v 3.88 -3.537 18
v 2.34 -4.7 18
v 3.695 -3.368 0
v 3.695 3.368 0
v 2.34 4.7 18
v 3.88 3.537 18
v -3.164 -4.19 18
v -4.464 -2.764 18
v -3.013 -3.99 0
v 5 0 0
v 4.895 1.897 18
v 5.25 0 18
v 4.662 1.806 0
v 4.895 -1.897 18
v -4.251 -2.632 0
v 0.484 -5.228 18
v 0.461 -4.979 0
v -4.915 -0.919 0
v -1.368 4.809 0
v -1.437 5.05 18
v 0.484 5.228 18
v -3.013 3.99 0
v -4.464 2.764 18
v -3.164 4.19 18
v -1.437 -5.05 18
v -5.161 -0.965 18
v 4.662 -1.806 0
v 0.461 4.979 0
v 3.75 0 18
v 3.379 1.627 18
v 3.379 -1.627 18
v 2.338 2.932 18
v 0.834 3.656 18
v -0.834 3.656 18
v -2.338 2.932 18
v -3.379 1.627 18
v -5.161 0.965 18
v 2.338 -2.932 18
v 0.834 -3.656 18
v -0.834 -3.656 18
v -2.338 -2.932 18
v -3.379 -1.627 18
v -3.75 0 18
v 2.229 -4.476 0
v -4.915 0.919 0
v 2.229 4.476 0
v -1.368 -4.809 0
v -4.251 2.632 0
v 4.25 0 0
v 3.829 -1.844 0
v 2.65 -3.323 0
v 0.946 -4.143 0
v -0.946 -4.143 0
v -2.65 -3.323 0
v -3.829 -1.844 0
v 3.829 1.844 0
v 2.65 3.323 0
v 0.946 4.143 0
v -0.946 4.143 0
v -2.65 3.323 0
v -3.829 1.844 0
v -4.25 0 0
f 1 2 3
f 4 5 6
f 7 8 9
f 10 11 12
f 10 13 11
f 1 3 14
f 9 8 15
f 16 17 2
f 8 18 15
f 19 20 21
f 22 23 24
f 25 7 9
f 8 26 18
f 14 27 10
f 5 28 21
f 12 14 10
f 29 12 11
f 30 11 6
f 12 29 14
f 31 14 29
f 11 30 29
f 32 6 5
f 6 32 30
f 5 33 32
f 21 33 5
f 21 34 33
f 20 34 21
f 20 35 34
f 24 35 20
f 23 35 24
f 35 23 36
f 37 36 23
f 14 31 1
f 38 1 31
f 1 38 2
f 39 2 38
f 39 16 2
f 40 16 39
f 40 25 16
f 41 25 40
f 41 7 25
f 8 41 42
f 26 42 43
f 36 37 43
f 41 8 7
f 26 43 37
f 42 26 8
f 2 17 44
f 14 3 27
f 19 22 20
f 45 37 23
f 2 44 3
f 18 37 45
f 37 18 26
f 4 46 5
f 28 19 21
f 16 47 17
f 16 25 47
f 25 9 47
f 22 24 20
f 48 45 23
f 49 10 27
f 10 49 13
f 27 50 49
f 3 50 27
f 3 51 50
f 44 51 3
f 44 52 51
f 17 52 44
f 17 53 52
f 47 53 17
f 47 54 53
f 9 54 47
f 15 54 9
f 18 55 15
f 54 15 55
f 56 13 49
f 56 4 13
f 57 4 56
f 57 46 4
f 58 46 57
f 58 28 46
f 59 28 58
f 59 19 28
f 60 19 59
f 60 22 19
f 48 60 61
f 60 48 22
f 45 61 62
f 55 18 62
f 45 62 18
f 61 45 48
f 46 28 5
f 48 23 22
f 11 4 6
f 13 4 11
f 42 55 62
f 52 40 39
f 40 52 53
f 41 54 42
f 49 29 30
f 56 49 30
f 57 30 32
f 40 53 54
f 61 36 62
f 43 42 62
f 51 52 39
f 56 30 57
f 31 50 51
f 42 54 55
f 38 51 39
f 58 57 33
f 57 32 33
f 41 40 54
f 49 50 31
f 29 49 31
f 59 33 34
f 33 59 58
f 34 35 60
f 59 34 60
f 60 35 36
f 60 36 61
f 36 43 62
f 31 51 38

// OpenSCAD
difference() {
    color("red") cylinder(h=18, r1=10/2, r2=10.5/2);
    color("blue") cylinder(h=18, r1=8.5/2, r2=7.5/2);
    translate([0, 0, 10]) color("green") cylinder(h=8, r1=7.5/2, r2=4.75/2);
}
